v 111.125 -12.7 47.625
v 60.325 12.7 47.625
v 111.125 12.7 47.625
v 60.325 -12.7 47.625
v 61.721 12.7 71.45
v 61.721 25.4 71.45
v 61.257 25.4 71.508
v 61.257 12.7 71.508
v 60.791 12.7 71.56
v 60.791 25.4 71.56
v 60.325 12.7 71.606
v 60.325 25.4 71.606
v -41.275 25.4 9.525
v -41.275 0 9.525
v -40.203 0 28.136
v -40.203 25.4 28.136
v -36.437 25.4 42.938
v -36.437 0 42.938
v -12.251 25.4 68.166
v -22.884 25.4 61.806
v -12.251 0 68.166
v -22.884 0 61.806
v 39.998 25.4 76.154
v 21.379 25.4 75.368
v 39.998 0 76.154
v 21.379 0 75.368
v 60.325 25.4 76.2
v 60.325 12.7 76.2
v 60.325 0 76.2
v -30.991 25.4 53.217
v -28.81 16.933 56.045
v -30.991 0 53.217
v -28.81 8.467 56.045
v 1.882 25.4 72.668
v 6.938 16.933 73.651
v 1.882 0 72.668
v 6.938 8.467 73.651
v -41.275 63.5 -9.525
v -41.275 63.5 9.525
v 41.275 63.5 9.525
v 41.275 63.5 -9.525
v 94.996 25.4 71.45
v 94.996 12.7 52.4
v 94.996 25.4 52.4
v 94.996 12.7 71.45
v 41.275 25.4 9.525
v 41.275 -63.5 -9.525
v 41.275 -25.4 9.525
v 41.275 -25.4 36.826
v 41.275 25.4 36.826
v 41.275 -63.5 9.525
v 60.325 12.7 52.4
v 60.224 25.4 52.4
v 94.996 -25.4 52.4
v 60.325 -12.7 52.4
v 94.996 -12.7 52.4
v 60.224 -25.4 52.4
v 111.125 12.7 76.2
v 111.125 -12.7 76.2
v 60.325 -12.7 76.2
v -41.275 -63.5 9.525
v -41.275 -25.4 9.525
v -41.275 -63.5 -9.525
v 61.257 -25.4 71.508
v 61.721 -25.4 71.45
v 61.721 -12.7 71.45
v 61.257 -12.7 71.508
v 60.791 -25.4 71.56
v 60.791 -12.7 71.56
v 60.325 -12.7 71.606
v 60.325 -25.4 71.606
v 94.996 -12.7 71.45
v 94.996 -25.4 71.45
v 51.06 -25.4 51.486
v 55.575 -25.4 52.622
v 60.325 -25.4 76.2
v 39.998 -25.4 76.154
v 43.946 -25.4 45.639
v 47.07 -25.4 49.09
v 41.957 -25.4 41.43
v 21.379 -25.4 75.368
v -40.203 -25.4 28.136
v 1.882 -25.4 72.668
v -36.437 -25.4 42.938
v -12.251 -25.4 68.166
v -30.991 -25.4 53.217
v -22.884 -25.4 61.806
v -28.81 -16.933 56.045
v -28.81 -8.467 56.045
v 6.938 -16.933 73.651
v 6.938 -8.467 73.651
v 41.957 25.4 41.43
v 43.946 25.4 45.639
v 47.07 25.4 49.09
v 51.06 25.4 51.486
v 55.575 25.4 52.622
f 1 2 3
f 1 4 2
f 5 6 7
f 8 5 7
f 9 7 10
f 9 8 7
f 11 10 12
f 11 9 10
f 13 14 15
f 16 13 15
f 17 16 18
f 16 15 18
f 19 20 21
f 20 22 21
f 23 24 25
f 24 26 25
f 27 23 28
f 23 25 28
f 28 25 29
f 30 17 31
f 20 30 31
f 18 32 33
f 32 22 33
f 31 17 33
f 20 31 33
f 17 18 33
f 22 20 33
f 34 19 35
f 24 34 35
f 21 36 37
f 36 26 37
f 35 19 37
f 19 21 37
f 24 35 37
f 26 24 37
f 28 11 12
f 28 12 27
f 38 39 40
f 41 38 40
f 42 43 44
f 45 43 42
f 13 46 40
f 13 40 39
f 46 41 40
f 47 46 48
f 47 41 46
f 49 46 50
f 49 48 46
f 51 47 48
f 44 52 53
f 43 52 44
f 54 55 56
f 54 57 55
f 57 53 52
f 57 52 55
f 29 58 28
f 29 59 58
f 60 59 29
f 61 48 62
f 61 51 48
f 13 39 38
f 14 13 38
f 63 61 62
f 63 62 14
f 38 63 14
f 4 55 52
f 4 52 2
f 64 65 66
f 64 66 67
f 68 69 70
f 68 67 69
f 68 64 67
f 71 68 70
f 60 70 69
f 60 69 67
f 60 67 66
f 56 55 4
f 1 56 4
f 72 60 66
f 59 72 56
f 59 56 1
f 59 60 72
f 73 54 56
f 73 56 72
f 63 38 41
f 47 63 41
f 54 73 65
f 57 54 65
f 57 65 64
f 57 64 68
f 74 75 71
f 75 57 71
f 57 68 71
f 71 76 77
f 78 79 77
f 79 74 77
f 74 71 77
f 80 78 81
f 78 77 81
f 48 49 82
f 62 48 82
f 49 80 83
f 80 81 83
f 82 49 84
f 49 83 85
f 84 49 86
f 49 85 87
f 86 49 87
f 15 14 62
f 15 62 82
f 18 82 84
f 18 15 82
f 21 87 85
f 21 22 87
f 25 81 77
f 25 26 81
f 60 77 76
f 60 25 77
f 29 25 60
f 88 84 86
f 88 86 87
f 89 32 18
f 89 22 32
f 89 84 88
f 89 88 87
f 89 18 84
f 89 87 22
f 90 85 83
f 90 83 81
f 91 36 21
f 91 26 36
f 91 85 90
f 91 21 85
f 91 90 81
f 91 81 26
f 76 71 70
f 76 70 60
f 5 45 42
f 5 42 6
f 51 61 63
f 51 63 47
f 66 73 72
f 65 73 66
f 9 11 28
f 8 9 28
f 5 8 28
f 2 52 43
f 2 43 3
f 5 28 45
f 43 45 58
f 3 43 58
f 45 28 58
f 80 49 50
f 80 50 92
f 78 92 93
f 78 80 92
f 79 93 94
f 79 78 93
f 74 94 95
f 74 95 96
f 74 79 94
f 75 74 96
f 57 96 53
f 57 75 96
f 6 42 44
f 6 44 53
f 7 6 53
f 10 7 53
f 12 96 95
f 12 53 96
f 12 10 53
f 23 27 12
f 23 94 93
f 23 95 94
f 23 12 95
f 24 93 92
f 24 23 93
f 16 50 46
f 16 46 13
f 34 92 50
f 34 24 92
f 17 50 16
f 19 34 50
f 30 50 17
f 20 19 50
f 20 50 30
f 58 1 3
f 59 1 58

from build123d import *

# Parameters (mm, degrees)
F1_DEPTH = 63.5
F2_DEPTH = 25.4
F3_DEPTH = 25.4
F4_DEPTH = 25.4
F5_DEPTH = 12.7


with BuildPart() as f1:
    # F0 (on Front) → F1 (new body, symmetric)
    with BuildSketch(Plane.XZ):
        Polygon((22.225, 9.525), (-41.275, 9.525), (-41.275, -9.525), (41.275, -9.525), (41.275, 9.525), align=None)
    extrude(amount=F1_DEPTH, both=True)

    # F0 (on Front) → F2 (join, symmetric)
    with BuildSketch(Plane.XZ):
        with BuildLine():
            Line((22.225, 36.82567), (22.225, 9.525))
            Line((22.225, 9.525), (41.275, 9.525))
            Line((41.275, 9.525), (41.275, 36.82567))
            ThreePointArc((41.275, 36.82567), (47.069933, 49.089759), (60.224024, 52.4002))
            Line((60.224024, 52.4002), (60.325, 52.4002))
            Line((60.325, 52.4002), (60.325, 71.606052))
            ThreePointArc((60.325, 71.606052), (33.60357, 62.619491), (22.225, 36.82567))
        make_face()
    extrude(amount=F2_DEPTH, both=True)

    # F0 (on Front) → F3 (join, symmetric)
    with BuildSketch(Plane.XZ):
        with BuildLine():
            ThreePointArc((61.72138, 71.4502), (61.023974, 71.535149), (60.325, 71.606052))
            Line((60.325, 71.606052), (60.325, 52.4002))
            Line((60.325, 52.4002), (94.995893, 52.4002))
            Line((94.995893, 52.4002), (94.995893, 71.4502))
            Line((94.995893, 71.4502), (61.72138, 71.4502))
        make_face()
    extrude(amount=F3_DEPTH, both=True)

    # F0 (on Front) → F4 (join, symmetric)
    with BuildSketch(Plane.XZ):
        with BuildLine():
            add(Edge.make_bspline(
                [(-41.275, 9.525), (-42.333655, 75.119734), (0, 76.560877), (60.325, 76.2)],
                knots=[0, 0, 0, 0, 121.524136, 121.524136, 121.524136, 121.524136], degree=3))
            Line((-41.275, 9.525), (22.225, 9.525))
            Line((22.225, 9.525), (22.225, 36.82567))
            ThreePointArc((22.225, 36.82567), (33.60357, 62.619491), (60.325, 71.606052))
            Line((60.325, 71.606052), (60.325, 76.2))
        make_face()
    extrude(amount=F4_DEPTH, both=True)

    # F0 (on Front) → F5 (join, symmetric)
    with BuildSketch(Plane.XZ):
        with BuildLine():
            Line((111.125, 76.2), (60.325, 76.2))
            Line((60.325, 76.2), (60.325, 71.606052))
            ThreePointArc((60.325, 71.606052), (61.023974, 71.535149), (61.72138, 71.4502))
            Line((61.72138, 71.4502), (94.995893, 71.4502))
            Line((94.995893, 71.4502), (94.995893, 52.4002))
            Line((94.995893, 52.4002), (60.325, 52.4002))
            Line((60.325, 52.4002), (60.325, 47.625))
            Line((60.325, 47.625), (111.125, 47.625))
            Line((111.125, 47.625), (111.125, 76.2))
        make_face()
    extrude(amount=F5_DEPTH, both=True)


solid = f1.part
